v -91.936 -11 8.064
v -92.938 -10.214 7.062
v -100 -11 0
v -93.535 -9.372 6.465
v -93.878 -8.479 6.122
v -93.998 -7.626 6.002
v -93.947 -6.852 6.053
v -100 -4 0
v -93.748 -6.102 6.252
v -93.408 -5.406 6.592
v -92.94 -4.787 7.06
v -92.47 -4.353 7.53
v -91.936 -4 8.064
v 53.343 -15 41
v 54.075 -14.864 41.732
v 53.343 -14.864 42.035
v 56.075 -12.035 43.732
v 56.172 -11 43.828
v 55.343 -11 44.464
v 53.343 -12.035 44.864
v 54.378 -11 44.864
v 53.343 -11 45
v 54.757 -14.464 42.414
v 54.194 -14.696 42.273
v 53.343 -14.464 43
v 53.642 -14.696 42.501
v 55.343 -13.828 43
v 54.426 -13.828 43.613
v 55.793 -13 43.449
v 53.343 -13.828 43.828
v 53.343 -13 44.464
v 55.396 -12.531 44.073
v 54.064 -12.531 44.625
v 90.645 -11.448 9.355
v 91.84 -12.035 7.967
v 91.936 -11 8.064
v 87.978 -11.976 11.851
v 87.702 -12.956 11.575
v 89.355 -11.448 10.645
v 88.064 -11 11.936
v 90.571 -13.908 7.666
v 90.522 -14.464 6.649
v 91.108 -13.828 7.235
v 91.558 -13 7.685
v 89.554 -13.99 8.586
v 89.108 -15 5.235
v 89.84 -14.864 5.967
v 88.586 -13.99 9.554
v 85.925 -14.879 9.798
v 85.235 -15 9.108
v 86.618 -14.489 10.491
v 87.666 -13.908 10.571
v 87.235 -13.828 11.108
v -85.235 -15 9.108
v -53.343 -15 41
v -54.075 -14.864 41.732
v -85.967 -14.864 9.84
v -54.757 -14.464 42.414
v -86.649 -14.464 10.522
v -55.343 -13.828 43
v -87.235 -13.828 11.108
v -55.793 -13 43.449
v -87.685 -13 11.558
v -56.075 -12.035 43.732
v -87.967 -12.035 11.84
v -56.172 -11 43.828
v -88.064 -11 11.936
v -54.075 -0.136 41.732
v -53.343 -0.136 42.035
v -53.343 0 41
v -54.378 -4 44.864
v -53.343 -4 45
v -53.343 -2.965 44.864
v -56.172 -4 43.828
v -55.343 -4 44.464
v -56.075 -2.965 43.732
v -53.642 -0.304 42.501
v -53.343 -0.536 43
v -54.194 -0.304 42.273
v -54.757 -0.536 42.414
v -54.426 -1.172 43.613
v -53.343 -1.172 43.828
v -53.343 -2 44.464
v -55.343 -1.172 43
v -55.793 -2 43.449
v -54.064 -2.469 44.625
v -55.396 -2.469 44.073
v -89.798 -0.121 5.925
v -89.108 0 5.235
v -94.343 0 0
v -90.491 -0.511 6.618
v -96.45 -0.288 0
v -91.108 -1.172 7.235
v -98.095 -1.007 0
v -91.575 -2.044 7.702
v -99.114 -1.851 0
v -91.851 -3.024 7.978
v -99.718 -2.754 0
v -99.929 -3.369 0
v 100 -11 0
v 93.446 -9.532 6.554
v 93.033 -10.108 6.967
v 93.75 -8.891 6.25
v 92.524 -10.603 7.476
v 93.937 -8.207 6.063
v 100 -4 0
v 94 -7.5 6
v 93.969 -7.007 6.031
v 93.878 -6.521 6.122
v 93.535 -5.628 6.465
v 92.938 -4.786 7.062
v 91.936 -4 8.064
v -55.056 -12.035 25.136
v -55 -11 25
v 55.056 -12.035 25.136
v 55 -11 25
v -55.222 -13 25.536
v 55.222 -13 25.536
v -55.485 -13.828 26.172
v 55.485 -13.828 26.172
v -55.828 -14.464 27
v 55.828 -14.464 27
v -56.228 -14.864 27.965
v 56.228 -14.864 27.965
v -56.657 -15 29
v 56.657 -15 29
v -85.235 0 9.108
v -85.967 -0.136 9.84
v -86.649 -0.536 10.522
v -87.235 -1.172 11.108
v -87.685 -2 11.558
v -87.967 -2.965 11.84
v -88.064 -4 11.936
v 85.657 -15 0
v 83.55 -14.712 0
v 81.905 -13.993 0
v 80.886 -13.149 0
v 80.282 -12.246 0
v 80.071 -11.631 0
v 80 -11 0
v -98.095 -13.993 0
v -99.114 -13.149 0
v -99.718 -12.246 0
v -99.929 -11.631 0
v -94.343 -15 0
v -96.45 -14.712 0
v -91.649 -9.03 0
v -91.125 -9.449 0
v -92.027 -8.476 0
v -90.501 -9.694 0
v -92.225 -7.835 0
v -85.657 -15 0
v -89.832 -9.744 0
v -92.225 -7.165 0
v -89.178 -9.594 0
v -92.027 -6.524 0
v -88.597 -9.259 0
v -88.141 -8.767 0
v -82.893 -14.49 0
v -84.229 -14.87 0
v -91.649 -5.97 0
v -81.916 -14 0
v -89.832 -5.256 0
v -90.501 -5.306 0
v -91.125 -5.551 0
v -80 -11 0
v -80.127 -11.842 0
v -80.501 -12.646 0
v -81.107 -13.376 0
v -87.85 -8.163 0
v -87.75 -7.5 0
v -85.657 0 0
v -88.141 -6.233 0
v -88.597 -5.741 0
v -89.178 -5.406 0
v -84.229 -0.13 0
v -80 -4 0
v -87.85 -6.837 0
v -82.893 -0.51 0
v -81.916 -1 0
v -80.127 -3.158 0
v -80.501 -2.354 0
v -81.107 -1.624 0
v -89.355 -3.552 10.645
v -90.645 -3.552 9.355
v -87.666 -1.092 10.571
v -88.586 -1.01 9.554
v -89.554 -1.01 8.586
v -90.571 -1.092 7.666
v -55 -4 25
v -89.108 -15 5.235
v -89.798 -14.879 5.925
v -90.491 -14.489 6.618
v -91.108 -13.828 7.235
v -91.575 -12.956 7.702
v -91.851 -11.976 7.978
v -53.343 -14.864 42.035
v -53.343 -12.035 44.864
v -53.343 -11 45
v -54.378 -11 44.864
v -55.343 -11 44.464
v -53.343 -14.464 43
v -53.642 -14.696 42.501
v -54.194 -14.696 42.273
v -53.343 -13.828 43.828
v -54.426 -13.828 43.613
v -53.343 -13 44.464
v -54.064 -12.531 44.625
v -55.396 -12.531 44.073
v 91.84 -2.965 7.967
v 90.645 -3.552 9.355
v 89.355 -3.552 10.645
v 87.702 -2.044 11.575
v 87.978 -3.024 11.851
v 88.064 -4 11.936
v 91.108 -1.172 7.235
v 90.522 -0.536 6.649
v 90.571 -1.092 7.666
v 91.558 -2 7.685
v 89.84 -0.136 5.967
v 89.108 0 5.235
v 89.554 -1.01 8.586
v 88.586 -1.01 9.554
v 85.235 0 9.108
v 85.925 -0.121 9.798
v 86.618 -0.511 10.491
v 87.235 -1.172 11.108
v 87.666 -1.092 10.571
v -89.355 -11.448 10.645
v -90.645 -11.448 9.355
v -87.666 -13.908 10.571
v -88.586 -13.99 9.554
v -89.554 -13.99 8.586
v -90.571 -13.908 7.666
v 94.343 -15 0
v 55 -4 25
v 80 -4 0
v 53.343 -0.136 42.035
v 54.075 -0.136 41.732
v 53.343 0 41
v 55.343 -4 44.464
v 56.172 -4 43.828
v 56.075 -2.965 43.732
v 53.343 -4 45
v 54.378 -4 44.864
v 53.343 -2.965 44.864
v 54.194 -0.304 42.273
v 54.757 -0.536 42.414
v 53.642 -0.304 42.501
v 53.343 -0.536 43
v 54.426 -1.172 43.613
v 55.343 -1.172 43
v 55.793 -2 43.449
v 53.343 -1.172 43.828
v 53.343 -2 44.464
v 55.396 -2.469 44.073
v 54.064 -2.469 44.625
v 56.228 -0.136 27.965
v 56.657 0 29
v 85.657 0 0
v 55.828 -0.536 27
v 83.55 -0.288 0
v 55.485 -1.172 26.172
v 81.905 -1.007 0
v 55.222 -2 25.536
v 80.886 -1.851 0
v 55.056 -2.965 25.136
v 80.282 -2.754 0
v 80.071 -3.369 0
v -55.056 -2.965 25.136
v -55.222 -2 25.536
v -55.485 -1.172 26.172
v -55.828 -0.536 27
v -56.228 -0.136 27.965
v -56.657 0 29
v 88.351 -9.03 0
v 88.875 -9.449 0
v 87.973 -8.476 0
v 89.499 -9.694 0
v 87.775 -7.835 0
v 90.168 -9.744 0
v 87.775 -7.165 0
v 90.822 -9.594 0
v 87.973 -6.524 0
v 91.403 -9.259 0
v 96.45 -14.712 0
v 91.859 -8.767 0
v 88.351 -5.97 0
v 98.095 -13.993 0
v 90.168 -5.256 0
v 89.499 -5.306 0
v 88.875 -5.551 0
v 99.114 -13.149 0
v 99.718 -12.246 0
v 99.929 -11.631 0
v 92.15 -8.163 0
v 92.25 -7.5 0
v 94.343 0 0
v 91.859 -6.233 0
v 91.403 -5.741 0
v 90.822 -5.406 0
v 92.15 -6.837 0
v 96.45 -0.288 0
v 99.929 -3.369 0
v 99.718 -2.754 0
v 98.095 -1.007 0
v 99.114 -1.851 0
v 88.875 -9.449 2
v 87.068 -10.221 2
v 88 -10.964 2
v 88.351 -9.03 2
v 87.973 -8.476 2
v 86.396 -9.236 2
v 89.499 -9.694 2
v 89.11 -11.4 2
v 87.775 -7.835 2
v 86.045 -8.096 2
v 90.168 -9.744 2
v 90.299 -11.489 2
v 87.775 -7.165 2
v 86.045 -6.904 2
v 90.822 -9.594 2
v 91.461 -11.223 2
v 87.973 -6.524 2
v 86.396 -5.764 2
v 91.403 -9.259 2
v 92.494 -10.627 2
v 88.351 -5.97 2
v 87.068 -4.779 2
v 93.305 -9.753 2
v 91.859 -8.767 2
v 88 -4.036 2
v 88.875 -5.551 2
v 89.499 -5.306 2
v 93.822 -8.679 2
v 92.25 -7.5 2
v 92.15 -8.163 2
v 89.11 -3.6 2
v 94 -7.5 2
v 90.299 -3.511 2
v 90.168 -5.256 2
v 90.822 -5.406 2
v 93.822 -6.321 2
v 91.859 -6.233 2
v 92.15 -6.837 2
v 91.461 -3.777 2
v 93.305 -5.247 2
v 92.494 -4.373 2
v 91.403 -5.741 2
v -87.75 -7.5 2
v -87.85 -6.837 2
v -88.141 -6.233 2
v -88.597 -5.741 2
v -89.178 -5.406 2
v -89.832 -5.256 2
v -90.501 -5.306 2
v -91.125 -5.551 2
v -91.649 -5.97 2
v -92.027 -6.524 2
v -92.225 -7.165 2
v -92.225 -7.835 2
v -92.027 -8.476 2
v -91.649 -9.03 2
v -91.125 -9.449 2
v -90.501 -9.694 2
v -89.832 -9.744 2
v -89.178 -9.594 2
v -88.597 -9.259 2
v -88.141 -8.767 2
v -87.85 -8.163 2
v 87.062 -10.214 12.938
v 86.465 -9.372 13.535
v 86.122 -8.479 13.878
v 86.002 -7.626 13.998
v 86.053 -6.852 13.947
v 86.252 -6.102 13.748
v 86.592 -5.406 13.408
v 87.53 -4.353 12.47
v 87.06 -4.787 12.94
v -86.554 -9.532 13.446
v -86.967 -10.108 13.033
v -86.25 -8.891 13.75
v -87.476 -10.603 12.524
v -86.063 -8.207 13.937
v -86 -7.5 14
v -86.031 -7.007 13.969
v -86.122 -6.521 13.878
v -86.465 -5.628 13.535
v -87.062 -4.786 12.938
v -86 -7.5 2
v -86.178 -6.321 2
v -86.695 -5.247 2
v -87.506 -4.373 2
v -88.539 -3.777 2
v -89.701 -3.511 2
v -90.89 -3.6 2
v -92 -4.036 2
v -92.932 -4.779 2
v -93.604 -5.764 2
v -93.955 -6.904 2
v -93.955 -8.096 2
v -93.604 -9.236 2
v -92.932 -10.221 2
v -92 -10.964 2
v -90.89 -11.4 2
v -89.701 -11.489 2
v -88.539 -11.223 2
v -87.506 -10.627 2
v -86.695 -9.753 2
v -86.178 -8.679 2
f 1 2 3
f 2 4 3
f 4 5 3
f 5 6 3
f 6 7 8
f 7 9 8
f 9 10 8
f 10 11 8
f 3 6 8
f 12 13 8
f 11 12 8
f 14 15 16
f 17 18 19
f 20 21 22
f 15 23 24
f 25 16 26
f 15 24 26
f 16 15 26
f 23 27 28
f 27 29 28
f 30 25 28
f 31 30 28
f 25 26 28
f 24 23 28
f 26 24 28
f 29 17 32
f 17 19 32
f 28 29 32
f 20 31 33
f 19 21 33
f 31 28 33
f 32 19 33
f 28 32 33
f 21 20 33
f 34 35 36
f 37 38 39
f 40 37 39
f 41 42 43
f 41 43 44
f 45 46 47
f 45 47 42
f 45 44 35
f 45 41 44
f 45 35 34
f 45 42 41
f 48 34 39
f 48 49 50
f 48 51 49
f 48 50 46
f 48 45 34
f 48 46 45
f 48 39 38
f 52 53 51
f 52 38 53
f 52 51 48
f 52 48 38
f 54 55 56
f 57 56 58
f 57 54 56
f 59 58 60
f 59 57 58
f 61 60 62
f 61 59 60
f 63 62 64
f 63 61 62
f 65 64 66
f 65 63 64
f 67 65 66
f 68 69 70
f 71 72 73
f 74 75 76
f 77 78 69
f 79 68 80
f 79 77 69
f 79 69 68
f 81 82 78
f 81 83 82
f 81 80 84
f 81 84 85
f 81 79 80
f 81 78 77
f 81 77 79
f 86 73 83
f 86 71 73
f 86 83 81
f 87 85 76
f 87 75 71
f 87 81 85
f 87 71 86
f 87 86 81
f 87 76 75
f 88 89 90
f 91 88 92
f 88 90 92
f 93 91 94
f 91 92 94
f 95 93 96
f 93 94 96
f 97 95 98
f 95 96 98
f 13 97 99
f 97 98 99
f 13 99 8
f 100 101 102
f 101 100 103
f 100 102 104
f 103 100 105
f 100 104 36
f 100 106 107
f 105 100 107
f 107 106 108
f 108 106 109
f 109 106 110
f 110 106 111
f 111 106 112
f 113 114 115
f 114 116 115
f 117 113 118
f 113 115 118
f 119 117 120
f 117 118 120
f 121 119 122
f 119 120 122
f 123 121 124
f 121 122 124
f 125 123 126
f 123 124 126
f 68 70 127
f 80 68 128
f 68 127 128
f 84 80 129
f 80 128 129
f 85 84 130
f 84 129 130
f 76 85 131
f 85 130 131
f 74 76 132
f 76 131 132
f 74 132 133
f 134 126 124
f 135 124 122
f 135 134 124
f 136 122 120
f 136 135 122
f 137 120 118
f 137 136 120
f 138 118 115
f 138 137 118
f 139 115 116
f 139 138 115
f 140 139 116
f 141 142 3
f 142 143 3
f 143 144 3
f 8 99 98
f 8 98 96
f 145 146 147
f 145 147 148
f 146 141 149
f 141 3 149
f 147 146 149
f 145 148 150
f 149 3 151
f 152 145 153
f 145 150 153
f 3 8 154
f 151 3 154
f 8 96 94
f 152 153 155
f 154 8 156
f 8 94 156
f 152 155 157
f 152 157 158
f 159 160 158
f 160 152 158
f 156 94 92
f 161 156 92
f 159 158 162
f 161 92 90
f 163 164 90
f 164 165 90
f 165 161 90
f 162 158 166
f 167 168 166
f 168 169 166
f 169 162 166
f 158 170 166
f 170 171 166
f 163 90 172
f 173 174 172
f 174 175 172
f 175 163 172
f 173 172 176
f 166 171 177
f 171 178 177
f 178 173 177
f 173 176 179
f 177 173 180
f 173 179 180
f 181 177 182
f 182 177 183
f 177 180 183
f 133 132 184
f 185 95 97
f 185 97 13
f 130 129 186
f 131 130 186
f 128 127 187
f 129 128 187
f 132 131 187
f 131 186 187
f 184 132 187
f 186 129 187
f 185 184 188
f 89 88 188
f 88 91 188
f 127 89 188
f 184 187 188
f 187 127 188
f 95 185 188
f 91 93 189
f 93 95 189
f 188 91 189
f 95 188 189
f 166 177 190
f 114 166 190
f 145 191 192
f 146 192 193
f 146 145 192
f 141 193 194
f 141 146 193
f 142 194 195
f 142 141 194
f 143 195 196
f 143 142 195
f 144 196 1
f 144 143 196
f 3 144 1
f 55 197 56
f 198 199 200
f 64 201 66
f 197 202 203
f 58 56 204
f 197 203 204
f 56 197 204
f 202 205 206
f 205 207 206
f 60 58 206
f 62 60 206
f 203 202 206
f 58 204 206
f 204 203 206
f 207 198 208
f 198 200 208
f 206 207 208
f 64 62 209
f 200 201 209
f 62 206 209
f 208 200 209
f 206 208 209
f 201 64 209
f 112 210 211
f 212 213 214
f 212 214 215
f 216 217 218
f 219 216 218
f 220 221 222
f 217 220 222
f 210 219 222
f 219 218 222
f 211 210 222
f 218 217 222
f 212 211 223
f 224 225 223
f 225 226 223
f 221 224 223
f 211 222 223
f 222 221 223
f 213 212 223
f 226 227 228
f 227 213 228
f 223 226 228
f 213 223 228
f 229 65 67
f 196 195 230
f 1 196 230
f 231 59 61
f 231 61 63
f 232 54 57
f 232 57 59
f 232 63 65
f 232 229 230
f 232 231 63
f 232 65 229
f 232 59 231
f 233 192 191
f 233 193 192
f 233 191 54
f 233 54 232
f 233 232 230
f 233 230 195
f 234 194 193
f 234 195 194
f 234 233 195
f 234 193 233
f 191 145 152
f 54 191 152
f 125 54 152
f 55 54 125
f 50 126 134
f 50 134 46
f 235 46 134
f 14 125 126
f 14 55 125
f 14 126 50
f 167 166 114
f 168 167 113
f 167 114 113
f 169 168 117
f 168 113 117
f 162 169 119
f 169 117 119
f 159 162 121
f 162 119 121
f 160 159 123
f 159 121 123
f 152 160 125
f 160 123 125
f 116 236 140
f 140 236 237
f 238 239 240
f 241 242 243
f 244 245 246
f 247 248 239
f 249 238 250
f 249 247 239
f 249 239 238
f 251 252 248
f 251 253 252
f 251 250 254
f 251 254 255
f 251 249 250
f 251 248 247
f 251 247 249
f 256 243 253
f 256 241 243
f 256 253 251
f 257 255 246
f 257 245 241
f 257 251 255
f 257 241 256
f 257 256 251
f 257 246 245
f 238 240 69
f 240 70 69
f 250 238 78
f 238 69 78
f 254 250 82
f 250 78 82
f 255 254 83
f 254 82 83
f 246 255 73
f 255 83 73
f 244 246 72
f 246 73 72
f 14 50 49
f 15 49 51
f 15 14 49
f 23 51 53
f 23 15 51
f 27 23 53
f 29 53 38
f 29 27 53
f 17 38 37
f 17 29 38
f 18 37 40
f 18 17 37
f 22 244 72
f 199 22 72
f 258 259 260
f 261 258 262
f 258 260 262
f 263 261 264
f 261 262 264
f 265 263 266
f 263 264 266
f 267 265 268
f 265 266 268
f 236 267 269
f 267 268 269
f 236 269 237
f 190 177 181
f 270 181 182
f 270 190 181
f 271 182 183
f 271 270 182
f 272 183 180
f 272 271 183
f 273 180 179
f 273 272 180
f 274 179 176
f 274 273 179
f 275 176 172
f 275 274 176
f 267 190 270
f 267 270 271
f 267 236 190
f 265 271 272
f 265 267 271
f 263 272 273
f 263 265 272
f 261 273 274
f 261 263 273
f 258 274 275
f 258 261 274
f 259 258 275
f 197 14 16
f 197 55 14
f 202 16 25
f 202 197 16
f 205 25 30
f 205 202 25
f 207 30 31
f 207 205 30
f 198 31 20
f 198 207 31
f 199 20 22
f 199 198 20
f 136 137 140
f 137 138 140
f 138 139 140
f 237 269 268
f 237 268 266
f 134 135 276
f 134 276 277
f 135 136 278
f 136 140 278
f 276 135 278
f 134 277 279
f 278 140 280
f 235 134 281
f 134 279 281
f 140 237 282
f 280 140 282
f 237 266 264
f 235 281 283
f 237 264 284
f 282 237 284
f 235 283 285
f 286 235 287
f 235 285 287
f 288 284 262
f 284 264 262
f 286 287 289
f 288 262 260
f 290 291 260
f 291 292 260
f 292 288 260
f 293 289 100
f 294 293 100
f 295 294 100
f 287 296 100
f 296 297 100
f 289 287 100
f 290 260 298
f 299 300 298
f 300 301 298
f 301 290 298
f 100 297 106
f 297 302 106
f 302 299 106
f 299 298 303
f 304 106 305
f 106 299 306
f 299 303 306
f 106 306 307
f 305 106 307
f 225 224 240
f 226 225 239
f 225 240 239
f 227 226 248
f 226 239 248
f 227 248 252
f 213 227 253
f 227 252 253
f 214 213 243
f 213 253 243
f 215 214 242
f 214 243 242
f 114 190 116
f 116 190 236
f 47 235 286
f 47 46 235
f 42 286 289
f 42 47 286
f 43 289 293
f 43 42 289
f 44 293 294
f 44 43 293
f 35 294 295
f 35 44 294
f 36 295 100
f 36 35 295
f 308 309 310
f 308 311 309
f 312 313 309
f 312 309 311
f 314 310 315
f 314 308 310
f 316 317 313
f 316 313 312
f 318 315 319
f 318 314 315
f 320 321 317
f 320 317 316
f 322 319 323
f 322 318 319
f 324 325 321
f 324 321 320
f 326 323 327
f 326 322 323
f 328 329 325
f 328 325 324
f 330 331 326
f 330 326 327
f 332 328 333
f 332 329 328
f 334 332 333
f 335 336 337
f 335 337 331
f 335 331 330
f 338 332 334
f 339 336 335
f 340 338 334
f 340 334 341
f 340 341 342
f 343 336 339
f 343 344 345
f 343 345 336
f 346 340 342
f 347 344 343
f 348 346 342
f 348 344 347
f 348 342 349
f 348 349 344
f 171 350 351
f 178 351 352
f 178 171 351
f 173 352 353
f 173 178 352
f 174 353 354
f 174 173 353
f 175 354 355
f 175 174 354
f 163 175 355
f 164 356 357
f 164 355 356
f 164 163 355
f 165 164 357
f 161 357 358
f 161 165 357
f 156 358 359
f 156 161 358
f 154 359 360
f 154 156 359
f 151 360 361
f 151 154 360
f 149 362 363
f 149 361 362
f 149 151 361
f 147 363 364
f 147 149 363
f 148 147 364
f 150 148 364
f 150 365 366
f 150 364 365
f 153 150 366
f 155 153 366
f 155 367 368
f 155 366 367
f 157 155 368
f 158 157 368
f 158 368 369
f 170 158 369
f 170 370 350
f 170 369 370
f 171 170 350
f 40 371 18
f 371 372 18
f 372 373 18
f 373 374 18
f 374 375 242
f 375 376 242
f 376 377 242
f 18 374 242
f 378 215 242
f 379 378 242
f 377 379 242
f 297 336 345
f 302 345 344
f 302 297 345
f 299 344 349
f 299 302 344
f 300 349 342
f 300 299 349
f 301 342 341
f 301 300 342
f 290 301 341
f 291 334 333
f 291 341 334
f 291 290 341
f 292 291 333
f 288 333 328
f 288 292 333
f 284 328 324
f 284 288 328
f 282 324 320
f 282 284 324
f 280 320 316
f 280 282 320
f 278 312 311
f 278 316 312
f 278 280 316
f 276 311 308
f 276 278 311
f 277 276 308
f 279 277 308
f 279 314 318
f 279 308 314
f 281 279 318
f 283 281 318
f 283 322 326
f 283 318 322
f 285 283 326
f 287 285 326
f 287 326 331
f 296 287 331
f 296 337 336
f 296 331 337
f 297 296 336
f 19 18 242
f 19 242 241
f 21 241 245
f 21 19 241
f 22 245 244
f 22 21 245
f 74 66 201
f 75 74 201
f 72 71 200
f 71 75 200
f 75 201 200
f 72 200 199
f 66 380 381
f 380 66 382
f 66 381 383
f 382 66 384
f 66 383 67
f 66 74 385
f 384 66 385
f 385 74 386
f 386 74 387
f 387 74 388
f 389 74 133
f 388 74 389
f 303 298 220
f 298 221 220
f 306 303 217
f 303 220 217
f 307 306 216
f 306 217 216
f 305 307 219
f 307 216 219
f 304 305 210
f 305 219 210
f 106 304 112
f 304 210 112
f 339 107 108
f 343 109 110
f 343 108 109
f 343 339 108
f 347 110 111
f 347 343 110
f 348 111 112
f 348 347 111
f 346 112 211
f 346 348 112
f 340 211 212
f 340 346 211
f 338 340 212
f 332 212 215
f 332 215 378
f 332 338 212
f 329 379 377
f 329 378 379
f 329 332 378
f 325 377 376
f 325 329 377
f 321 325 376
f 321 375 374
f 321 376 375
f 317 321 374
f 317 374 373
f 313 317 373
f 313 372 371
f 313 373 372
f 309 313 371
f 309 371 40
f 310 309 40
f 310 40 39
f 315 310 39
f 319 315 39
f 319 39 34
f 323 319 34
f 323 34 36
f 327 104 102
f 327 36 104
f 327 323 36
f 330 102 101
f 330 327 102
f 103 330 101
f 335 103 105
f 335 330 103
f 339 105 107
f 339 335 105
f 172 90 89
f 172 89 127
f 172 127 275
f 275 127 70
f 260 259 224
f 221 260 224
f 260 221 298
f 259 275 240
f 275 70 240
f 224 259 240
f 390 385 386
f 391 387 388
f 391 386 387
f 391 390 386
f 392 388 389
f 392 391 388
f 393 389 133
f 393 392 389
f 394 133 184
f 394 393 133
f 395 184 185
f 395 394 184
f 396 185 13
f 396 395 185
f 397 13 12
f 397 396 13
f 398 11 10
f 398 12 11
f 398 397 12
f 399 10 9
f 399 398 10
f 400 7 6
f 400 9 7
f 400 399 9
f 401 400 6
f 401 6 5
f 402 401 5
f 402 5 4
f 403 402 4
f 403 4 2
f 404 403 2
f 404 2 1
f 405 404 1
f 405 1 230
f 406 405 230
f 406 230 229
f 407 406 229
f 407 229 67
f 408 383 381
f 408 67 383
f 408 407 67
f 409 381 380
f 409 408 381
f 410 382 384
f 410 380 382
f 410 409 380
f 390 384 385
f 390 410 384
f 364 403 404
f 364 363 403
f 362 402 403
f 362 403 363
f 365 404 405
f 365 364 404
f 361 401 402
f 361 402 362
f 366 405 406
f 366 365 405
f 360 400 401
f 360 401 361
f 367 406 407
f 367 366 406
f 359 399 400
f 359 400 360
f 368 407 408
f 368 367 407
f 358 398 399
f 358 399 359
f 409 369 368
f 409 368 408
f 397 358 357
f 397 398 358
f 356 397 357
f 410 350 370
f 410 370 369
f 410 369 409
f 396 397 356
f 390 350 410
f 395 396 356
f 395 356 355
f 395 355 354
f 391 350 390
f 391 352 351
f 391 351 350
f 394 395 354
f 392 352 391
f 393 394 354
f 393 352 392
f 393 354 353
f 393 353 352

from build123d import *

# Parameters (mm, degrees)
CYLINDER_R        = 2.25
CYLINDER_DEPTH    = 10
CYLINDER001_R     = 4
CYLINDER001_DEPTH = 25
CYLINDER002_R     = 2.25
CYLINDER002_DEPTH = 10
CYLINDER003_R     = 4
CYLINDER003_DEPTH = 25
PAD_DEPTH         = 15
FILLET_R          = 4


with BuildPart() as cylinder:
    # Cylinder → Cylinder (new body)
    with BuildSketch(Plane.XY):
        Circle(CYLINDER_R)
    extrude(amount=CYLINDER_DEPTH)


with BuildPart() as fusion:
    # Cylinder001 → Cylinder001 (new body)
    with BuildSketch(Plane.XY.offset(2)):
        Circle(CYLINDER001_R)
    extrude(amount=CYLINDER001_DEPTH)

    # Fusion: union Cylinder
    add(cylinder.part)


with BuildPart() as fusion_1:
    # Fusion placement: moved
    add(fusion.part.moved(Location((90, -7.5, 0))))


with BuildPart() as cylinder002:
    # Cylinder002 → Cylinder002 (new body)
    with BuildSketch(Plane.XY):
        Circle(CYLINDER002_R)
    extrude(amount=CYLINDER002_DEPTH)


with BuildPart() as fusion002:
    # Cylinder003 → Cylinder003 (new body)
    with BuildSketch(Plane.XY.offset(2)):
        Circle(CYLINDER003_R)
    extrude(amount=CYLINDER003_DEPTH)

    # Fusion001: union Cylinder002
    add(cylinder002.part)


with BuildPart() as fusion002_1:
    # Fusion001 placement: moved
    add(fusion002.part.moved(Location((-90, -7.5, 0))))

    # Fusion002: union Fusion
    add(fusion_1.part)


with BuildPart() as fillet_body:
    # Sketch → Pad (new body)
    with BuildSketch(Plane.XZ):
        Polygon((-80, 0), (-55, 25), (55, 25), (80, 0), (100, 0), (55, 45), (-55, 45), (-100, 0), align=None)
    extrude(amount=PAD_DEPTH)

    # Cut: cut Fusion002
    add(fusion002_1.part, mode=Mode.SUBTRACT)

    # Fillet
    fillet_edges = [fillet_body.edges().sort_by_distance(p)[0] for p in [
        (-67.5, 0, 12.5),
        (-67.5, -15, 12.5),
        (0, 0, 25),
        (0, -15, 25),
        (67.5, 0, 12.5),
        (77.5, 0, 22.5),
        (0, 0, 45),
        (-77.5, 0, 22.5),
        (67.5, -15, 12.5),
        (77.5, -15, 22.5),
        (0, -15, 45),
        (-77.5, -15, 22.5),
        (-55, -7.5, 45),
        (55, -7.5, 45),
    ]]
    fillet(fillet_edges, radius=FILLET_R)


solid = fillet_body.part
